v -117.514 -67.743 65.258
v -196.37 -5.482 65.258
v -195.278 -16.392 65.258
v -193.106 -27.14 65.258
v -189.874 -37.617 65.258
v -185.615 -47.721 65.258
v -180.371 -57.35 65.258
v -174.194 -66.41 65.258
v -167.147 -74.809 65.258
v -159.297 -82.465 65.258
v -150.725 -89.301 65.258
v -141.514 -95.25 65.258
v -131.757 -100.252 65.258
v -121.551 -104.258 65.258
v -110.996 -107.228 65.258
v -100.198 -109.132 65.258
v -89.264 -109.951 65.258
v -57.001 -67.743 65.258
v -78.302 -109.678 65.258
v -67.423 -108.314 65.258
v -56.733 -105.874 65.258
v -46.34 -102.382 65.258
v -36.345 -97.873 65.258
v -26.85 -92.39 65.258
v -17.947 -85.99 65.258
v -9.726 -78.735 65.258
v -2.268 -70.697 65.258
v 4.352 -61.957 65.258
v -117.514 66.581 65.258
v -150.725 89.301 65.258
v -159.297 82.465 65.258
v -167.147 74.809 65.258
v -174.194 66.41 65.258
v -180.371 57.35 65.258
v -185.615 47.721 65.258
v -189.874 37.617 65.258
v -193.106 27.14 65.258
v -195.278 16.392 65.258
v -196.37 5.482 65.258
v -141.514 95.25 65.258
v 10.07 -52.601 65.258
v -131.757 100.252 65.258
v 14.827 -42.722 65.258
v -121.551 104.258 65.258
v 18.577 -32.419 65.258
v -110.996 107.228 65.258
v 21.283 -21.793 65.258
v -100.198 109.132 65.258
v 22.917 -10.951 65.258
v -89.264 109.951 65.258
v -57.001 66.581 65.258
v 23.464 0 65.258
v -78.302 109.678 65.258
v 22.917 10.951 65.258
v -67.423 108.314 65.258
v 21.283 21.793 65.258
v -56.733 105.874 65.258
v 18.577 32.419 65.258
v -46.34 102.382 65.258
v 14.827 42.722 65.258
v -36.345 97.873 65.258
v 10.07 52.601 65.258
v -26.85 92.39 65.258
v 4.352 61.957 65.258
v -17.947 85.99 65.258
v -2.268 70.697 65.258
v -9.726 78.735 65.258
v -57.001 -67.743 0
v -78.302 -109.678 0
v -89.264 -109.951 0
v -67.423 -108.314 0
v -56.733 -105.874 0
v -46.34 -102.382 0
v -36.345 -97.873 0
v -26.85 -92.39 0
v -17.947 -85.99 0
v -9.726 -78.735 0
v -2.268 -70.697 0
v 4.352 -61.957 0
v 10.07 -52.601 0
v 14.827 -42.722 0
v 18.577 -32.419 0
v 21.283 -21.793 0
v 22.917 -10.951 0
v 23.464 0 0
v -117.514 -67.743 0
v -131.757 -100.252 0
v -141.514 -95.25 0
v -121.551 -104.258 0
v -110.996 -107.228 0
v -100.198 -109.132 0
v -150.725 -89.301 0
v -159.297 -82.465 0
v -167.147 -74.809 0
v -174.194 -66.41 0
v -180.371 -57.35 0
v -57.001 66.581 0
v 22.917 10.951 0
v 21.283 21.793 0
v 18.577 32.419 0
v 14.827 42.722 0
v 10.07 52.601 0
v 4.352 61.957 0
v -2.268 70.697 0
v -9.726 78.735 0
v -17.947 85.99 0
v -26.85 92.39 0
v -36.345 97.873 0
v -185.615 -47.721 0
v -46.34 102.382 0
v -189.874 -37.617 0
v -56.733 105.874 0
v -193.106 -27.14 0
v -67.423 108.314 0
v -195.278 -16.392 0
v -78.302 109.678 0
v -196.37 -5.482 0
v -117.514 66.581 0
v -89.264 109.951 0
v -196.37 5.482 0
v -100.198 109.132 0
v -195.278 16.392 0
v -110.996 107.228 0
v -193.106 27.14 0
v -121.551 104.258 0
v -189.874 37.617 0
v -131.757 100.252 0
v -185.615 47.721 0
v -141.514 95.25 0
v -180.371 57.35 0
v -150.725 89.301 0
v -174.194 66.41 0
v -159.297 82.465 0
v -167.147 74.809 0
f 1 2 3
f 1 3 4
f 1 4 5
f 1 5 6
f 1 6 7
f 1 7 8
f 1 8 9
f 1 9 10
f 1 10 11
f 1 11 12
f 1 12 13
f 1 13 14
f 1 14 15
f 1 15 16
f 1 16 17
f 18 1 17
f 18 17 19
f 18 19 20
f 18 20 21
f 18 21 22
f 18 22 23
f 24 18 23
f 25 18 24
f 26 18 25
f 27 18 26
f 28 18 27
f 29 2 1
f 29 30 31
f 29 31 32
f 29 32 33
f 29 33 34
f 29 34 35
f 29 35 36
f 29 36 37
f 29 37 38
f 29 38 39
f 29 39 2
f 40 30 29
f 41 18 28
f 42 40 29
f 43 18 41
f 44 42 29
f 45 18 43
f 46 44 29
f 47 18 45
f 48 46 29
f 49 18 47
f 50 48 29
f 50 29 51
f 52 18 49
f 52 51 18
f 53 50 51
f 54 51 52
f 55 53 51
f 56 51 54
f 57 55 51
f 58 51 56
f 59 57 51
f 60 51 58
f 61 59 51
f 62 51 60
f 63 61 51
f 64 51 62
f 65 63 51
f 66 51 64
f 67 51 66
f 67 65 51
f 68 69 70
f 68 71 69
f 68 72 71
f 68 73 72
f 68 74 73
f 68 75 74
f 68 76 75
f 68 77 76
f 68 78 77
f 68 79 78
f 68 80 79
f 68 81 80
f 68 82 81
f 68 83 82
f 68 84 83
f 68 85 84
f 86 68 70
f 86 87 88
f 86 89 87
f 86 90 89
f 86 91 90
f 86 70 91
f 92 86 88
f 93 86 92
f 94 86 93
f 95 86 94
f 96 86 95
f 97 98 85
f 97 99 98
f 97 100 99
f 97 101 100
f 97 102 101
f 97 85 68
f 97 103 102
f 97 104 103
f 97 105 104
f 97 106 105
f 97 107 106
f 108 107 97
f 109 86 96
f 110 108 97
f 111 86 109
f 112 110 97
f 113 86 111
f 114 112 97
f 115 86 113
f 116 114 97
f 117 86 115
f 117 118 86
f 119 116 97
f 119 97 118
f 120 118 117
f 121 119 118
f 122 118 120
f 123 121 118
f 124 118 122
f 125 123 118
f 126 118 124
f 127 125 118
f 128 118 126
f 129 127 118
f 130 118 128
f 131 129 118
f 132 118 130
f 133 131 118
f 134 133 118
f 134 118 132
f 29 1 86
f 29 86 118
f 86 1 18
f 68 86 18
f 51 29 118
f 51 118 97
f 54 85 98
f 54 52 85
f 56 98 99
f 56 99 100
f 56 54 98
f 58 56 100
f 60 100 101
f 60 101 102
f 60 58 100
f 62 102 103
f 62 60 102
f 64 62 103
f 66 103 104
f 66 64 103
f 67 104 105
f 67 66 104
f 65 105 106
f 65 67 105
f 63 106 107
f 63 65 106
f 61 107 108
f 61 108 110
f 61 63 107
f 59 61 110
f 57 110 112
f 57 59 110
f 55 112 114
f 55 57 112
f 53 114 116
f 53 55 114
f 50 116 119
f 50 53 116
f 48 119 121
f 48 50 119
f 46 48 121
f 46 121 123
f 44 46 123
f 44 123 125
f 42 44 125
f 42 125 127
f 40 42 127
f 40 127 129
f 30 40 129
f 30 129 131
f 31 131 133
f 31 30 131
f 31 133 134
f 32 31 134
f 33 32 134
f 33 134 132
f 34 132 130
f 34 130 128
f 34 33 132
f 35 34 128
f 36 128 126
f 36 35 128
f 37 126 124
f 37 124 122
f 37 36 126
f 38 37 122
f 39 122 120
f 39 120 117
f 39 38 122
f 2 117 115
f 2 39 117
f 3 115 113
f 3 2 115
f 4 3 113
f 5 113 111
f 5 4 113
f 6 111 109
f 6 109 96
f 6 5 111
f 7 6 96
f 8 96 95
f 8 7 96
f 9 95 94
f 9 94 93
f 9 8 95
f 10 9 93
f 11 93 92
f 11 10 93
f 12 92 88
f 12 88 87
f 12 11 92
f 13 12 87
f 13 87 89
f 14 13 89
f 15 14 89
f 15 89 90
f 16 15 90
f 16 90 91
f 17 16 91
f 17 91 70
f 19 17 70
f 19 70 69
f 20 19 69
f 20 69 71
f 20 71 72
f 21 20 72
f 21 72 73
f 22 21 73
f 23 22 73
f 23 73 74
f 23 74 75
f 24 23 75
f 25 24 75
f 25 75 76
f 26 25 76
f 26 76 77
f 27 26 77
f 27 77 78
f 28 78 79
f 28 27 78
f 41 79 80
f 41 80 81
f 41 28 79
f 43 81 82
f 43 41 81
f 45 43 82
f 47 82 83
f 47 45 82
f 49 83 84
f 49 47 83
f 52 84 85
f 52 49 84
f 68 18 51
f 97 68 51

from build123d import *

# Parameters (mm, degrees)
F3_D     = 6.35
F4_W     = 60.513176
F4_H     = 134.324468
F4_R     = 3.175
F5_DEPTH = 65.258862


with BuildPart() as f1:
    # F0 (on Front) → F1 (revolve)
    with BuildSketch(Plane.XZ):
        Polygon((-7.151507, 0), (23.463517, 0), (23.463517, 65.257862), (-86.5217, 65.257862), (-86.5217, 0), align=None)
    revolve(axis=Axis((-86.5217, 0, 32.628931), (0, 0, 1)))

    # F3 (through all)
    with Locations(Plane(origin=(0, 0, 0), x_dir=(1, 0, 0), z_dir=(0, 0, -1))):
        with Locations((-90.931758, 0)):
            Hole(F3_D / 2)

    # F4 (on face) → F5 (cut, through all)
    with BuildSketch(Plane.XY.offset(65.257862)):
        with Locations((-87.257598, -0.581134)):
            Rectangle(F4_W, F4_H)
        with Locations((-90.931758, 0)):
            Circle(F4_R, mode=Mode.SUBTRACT)
    extrude(amount=-F5_DEPTH, mode=Mode.SUBTRACT)


solid = f1.part
